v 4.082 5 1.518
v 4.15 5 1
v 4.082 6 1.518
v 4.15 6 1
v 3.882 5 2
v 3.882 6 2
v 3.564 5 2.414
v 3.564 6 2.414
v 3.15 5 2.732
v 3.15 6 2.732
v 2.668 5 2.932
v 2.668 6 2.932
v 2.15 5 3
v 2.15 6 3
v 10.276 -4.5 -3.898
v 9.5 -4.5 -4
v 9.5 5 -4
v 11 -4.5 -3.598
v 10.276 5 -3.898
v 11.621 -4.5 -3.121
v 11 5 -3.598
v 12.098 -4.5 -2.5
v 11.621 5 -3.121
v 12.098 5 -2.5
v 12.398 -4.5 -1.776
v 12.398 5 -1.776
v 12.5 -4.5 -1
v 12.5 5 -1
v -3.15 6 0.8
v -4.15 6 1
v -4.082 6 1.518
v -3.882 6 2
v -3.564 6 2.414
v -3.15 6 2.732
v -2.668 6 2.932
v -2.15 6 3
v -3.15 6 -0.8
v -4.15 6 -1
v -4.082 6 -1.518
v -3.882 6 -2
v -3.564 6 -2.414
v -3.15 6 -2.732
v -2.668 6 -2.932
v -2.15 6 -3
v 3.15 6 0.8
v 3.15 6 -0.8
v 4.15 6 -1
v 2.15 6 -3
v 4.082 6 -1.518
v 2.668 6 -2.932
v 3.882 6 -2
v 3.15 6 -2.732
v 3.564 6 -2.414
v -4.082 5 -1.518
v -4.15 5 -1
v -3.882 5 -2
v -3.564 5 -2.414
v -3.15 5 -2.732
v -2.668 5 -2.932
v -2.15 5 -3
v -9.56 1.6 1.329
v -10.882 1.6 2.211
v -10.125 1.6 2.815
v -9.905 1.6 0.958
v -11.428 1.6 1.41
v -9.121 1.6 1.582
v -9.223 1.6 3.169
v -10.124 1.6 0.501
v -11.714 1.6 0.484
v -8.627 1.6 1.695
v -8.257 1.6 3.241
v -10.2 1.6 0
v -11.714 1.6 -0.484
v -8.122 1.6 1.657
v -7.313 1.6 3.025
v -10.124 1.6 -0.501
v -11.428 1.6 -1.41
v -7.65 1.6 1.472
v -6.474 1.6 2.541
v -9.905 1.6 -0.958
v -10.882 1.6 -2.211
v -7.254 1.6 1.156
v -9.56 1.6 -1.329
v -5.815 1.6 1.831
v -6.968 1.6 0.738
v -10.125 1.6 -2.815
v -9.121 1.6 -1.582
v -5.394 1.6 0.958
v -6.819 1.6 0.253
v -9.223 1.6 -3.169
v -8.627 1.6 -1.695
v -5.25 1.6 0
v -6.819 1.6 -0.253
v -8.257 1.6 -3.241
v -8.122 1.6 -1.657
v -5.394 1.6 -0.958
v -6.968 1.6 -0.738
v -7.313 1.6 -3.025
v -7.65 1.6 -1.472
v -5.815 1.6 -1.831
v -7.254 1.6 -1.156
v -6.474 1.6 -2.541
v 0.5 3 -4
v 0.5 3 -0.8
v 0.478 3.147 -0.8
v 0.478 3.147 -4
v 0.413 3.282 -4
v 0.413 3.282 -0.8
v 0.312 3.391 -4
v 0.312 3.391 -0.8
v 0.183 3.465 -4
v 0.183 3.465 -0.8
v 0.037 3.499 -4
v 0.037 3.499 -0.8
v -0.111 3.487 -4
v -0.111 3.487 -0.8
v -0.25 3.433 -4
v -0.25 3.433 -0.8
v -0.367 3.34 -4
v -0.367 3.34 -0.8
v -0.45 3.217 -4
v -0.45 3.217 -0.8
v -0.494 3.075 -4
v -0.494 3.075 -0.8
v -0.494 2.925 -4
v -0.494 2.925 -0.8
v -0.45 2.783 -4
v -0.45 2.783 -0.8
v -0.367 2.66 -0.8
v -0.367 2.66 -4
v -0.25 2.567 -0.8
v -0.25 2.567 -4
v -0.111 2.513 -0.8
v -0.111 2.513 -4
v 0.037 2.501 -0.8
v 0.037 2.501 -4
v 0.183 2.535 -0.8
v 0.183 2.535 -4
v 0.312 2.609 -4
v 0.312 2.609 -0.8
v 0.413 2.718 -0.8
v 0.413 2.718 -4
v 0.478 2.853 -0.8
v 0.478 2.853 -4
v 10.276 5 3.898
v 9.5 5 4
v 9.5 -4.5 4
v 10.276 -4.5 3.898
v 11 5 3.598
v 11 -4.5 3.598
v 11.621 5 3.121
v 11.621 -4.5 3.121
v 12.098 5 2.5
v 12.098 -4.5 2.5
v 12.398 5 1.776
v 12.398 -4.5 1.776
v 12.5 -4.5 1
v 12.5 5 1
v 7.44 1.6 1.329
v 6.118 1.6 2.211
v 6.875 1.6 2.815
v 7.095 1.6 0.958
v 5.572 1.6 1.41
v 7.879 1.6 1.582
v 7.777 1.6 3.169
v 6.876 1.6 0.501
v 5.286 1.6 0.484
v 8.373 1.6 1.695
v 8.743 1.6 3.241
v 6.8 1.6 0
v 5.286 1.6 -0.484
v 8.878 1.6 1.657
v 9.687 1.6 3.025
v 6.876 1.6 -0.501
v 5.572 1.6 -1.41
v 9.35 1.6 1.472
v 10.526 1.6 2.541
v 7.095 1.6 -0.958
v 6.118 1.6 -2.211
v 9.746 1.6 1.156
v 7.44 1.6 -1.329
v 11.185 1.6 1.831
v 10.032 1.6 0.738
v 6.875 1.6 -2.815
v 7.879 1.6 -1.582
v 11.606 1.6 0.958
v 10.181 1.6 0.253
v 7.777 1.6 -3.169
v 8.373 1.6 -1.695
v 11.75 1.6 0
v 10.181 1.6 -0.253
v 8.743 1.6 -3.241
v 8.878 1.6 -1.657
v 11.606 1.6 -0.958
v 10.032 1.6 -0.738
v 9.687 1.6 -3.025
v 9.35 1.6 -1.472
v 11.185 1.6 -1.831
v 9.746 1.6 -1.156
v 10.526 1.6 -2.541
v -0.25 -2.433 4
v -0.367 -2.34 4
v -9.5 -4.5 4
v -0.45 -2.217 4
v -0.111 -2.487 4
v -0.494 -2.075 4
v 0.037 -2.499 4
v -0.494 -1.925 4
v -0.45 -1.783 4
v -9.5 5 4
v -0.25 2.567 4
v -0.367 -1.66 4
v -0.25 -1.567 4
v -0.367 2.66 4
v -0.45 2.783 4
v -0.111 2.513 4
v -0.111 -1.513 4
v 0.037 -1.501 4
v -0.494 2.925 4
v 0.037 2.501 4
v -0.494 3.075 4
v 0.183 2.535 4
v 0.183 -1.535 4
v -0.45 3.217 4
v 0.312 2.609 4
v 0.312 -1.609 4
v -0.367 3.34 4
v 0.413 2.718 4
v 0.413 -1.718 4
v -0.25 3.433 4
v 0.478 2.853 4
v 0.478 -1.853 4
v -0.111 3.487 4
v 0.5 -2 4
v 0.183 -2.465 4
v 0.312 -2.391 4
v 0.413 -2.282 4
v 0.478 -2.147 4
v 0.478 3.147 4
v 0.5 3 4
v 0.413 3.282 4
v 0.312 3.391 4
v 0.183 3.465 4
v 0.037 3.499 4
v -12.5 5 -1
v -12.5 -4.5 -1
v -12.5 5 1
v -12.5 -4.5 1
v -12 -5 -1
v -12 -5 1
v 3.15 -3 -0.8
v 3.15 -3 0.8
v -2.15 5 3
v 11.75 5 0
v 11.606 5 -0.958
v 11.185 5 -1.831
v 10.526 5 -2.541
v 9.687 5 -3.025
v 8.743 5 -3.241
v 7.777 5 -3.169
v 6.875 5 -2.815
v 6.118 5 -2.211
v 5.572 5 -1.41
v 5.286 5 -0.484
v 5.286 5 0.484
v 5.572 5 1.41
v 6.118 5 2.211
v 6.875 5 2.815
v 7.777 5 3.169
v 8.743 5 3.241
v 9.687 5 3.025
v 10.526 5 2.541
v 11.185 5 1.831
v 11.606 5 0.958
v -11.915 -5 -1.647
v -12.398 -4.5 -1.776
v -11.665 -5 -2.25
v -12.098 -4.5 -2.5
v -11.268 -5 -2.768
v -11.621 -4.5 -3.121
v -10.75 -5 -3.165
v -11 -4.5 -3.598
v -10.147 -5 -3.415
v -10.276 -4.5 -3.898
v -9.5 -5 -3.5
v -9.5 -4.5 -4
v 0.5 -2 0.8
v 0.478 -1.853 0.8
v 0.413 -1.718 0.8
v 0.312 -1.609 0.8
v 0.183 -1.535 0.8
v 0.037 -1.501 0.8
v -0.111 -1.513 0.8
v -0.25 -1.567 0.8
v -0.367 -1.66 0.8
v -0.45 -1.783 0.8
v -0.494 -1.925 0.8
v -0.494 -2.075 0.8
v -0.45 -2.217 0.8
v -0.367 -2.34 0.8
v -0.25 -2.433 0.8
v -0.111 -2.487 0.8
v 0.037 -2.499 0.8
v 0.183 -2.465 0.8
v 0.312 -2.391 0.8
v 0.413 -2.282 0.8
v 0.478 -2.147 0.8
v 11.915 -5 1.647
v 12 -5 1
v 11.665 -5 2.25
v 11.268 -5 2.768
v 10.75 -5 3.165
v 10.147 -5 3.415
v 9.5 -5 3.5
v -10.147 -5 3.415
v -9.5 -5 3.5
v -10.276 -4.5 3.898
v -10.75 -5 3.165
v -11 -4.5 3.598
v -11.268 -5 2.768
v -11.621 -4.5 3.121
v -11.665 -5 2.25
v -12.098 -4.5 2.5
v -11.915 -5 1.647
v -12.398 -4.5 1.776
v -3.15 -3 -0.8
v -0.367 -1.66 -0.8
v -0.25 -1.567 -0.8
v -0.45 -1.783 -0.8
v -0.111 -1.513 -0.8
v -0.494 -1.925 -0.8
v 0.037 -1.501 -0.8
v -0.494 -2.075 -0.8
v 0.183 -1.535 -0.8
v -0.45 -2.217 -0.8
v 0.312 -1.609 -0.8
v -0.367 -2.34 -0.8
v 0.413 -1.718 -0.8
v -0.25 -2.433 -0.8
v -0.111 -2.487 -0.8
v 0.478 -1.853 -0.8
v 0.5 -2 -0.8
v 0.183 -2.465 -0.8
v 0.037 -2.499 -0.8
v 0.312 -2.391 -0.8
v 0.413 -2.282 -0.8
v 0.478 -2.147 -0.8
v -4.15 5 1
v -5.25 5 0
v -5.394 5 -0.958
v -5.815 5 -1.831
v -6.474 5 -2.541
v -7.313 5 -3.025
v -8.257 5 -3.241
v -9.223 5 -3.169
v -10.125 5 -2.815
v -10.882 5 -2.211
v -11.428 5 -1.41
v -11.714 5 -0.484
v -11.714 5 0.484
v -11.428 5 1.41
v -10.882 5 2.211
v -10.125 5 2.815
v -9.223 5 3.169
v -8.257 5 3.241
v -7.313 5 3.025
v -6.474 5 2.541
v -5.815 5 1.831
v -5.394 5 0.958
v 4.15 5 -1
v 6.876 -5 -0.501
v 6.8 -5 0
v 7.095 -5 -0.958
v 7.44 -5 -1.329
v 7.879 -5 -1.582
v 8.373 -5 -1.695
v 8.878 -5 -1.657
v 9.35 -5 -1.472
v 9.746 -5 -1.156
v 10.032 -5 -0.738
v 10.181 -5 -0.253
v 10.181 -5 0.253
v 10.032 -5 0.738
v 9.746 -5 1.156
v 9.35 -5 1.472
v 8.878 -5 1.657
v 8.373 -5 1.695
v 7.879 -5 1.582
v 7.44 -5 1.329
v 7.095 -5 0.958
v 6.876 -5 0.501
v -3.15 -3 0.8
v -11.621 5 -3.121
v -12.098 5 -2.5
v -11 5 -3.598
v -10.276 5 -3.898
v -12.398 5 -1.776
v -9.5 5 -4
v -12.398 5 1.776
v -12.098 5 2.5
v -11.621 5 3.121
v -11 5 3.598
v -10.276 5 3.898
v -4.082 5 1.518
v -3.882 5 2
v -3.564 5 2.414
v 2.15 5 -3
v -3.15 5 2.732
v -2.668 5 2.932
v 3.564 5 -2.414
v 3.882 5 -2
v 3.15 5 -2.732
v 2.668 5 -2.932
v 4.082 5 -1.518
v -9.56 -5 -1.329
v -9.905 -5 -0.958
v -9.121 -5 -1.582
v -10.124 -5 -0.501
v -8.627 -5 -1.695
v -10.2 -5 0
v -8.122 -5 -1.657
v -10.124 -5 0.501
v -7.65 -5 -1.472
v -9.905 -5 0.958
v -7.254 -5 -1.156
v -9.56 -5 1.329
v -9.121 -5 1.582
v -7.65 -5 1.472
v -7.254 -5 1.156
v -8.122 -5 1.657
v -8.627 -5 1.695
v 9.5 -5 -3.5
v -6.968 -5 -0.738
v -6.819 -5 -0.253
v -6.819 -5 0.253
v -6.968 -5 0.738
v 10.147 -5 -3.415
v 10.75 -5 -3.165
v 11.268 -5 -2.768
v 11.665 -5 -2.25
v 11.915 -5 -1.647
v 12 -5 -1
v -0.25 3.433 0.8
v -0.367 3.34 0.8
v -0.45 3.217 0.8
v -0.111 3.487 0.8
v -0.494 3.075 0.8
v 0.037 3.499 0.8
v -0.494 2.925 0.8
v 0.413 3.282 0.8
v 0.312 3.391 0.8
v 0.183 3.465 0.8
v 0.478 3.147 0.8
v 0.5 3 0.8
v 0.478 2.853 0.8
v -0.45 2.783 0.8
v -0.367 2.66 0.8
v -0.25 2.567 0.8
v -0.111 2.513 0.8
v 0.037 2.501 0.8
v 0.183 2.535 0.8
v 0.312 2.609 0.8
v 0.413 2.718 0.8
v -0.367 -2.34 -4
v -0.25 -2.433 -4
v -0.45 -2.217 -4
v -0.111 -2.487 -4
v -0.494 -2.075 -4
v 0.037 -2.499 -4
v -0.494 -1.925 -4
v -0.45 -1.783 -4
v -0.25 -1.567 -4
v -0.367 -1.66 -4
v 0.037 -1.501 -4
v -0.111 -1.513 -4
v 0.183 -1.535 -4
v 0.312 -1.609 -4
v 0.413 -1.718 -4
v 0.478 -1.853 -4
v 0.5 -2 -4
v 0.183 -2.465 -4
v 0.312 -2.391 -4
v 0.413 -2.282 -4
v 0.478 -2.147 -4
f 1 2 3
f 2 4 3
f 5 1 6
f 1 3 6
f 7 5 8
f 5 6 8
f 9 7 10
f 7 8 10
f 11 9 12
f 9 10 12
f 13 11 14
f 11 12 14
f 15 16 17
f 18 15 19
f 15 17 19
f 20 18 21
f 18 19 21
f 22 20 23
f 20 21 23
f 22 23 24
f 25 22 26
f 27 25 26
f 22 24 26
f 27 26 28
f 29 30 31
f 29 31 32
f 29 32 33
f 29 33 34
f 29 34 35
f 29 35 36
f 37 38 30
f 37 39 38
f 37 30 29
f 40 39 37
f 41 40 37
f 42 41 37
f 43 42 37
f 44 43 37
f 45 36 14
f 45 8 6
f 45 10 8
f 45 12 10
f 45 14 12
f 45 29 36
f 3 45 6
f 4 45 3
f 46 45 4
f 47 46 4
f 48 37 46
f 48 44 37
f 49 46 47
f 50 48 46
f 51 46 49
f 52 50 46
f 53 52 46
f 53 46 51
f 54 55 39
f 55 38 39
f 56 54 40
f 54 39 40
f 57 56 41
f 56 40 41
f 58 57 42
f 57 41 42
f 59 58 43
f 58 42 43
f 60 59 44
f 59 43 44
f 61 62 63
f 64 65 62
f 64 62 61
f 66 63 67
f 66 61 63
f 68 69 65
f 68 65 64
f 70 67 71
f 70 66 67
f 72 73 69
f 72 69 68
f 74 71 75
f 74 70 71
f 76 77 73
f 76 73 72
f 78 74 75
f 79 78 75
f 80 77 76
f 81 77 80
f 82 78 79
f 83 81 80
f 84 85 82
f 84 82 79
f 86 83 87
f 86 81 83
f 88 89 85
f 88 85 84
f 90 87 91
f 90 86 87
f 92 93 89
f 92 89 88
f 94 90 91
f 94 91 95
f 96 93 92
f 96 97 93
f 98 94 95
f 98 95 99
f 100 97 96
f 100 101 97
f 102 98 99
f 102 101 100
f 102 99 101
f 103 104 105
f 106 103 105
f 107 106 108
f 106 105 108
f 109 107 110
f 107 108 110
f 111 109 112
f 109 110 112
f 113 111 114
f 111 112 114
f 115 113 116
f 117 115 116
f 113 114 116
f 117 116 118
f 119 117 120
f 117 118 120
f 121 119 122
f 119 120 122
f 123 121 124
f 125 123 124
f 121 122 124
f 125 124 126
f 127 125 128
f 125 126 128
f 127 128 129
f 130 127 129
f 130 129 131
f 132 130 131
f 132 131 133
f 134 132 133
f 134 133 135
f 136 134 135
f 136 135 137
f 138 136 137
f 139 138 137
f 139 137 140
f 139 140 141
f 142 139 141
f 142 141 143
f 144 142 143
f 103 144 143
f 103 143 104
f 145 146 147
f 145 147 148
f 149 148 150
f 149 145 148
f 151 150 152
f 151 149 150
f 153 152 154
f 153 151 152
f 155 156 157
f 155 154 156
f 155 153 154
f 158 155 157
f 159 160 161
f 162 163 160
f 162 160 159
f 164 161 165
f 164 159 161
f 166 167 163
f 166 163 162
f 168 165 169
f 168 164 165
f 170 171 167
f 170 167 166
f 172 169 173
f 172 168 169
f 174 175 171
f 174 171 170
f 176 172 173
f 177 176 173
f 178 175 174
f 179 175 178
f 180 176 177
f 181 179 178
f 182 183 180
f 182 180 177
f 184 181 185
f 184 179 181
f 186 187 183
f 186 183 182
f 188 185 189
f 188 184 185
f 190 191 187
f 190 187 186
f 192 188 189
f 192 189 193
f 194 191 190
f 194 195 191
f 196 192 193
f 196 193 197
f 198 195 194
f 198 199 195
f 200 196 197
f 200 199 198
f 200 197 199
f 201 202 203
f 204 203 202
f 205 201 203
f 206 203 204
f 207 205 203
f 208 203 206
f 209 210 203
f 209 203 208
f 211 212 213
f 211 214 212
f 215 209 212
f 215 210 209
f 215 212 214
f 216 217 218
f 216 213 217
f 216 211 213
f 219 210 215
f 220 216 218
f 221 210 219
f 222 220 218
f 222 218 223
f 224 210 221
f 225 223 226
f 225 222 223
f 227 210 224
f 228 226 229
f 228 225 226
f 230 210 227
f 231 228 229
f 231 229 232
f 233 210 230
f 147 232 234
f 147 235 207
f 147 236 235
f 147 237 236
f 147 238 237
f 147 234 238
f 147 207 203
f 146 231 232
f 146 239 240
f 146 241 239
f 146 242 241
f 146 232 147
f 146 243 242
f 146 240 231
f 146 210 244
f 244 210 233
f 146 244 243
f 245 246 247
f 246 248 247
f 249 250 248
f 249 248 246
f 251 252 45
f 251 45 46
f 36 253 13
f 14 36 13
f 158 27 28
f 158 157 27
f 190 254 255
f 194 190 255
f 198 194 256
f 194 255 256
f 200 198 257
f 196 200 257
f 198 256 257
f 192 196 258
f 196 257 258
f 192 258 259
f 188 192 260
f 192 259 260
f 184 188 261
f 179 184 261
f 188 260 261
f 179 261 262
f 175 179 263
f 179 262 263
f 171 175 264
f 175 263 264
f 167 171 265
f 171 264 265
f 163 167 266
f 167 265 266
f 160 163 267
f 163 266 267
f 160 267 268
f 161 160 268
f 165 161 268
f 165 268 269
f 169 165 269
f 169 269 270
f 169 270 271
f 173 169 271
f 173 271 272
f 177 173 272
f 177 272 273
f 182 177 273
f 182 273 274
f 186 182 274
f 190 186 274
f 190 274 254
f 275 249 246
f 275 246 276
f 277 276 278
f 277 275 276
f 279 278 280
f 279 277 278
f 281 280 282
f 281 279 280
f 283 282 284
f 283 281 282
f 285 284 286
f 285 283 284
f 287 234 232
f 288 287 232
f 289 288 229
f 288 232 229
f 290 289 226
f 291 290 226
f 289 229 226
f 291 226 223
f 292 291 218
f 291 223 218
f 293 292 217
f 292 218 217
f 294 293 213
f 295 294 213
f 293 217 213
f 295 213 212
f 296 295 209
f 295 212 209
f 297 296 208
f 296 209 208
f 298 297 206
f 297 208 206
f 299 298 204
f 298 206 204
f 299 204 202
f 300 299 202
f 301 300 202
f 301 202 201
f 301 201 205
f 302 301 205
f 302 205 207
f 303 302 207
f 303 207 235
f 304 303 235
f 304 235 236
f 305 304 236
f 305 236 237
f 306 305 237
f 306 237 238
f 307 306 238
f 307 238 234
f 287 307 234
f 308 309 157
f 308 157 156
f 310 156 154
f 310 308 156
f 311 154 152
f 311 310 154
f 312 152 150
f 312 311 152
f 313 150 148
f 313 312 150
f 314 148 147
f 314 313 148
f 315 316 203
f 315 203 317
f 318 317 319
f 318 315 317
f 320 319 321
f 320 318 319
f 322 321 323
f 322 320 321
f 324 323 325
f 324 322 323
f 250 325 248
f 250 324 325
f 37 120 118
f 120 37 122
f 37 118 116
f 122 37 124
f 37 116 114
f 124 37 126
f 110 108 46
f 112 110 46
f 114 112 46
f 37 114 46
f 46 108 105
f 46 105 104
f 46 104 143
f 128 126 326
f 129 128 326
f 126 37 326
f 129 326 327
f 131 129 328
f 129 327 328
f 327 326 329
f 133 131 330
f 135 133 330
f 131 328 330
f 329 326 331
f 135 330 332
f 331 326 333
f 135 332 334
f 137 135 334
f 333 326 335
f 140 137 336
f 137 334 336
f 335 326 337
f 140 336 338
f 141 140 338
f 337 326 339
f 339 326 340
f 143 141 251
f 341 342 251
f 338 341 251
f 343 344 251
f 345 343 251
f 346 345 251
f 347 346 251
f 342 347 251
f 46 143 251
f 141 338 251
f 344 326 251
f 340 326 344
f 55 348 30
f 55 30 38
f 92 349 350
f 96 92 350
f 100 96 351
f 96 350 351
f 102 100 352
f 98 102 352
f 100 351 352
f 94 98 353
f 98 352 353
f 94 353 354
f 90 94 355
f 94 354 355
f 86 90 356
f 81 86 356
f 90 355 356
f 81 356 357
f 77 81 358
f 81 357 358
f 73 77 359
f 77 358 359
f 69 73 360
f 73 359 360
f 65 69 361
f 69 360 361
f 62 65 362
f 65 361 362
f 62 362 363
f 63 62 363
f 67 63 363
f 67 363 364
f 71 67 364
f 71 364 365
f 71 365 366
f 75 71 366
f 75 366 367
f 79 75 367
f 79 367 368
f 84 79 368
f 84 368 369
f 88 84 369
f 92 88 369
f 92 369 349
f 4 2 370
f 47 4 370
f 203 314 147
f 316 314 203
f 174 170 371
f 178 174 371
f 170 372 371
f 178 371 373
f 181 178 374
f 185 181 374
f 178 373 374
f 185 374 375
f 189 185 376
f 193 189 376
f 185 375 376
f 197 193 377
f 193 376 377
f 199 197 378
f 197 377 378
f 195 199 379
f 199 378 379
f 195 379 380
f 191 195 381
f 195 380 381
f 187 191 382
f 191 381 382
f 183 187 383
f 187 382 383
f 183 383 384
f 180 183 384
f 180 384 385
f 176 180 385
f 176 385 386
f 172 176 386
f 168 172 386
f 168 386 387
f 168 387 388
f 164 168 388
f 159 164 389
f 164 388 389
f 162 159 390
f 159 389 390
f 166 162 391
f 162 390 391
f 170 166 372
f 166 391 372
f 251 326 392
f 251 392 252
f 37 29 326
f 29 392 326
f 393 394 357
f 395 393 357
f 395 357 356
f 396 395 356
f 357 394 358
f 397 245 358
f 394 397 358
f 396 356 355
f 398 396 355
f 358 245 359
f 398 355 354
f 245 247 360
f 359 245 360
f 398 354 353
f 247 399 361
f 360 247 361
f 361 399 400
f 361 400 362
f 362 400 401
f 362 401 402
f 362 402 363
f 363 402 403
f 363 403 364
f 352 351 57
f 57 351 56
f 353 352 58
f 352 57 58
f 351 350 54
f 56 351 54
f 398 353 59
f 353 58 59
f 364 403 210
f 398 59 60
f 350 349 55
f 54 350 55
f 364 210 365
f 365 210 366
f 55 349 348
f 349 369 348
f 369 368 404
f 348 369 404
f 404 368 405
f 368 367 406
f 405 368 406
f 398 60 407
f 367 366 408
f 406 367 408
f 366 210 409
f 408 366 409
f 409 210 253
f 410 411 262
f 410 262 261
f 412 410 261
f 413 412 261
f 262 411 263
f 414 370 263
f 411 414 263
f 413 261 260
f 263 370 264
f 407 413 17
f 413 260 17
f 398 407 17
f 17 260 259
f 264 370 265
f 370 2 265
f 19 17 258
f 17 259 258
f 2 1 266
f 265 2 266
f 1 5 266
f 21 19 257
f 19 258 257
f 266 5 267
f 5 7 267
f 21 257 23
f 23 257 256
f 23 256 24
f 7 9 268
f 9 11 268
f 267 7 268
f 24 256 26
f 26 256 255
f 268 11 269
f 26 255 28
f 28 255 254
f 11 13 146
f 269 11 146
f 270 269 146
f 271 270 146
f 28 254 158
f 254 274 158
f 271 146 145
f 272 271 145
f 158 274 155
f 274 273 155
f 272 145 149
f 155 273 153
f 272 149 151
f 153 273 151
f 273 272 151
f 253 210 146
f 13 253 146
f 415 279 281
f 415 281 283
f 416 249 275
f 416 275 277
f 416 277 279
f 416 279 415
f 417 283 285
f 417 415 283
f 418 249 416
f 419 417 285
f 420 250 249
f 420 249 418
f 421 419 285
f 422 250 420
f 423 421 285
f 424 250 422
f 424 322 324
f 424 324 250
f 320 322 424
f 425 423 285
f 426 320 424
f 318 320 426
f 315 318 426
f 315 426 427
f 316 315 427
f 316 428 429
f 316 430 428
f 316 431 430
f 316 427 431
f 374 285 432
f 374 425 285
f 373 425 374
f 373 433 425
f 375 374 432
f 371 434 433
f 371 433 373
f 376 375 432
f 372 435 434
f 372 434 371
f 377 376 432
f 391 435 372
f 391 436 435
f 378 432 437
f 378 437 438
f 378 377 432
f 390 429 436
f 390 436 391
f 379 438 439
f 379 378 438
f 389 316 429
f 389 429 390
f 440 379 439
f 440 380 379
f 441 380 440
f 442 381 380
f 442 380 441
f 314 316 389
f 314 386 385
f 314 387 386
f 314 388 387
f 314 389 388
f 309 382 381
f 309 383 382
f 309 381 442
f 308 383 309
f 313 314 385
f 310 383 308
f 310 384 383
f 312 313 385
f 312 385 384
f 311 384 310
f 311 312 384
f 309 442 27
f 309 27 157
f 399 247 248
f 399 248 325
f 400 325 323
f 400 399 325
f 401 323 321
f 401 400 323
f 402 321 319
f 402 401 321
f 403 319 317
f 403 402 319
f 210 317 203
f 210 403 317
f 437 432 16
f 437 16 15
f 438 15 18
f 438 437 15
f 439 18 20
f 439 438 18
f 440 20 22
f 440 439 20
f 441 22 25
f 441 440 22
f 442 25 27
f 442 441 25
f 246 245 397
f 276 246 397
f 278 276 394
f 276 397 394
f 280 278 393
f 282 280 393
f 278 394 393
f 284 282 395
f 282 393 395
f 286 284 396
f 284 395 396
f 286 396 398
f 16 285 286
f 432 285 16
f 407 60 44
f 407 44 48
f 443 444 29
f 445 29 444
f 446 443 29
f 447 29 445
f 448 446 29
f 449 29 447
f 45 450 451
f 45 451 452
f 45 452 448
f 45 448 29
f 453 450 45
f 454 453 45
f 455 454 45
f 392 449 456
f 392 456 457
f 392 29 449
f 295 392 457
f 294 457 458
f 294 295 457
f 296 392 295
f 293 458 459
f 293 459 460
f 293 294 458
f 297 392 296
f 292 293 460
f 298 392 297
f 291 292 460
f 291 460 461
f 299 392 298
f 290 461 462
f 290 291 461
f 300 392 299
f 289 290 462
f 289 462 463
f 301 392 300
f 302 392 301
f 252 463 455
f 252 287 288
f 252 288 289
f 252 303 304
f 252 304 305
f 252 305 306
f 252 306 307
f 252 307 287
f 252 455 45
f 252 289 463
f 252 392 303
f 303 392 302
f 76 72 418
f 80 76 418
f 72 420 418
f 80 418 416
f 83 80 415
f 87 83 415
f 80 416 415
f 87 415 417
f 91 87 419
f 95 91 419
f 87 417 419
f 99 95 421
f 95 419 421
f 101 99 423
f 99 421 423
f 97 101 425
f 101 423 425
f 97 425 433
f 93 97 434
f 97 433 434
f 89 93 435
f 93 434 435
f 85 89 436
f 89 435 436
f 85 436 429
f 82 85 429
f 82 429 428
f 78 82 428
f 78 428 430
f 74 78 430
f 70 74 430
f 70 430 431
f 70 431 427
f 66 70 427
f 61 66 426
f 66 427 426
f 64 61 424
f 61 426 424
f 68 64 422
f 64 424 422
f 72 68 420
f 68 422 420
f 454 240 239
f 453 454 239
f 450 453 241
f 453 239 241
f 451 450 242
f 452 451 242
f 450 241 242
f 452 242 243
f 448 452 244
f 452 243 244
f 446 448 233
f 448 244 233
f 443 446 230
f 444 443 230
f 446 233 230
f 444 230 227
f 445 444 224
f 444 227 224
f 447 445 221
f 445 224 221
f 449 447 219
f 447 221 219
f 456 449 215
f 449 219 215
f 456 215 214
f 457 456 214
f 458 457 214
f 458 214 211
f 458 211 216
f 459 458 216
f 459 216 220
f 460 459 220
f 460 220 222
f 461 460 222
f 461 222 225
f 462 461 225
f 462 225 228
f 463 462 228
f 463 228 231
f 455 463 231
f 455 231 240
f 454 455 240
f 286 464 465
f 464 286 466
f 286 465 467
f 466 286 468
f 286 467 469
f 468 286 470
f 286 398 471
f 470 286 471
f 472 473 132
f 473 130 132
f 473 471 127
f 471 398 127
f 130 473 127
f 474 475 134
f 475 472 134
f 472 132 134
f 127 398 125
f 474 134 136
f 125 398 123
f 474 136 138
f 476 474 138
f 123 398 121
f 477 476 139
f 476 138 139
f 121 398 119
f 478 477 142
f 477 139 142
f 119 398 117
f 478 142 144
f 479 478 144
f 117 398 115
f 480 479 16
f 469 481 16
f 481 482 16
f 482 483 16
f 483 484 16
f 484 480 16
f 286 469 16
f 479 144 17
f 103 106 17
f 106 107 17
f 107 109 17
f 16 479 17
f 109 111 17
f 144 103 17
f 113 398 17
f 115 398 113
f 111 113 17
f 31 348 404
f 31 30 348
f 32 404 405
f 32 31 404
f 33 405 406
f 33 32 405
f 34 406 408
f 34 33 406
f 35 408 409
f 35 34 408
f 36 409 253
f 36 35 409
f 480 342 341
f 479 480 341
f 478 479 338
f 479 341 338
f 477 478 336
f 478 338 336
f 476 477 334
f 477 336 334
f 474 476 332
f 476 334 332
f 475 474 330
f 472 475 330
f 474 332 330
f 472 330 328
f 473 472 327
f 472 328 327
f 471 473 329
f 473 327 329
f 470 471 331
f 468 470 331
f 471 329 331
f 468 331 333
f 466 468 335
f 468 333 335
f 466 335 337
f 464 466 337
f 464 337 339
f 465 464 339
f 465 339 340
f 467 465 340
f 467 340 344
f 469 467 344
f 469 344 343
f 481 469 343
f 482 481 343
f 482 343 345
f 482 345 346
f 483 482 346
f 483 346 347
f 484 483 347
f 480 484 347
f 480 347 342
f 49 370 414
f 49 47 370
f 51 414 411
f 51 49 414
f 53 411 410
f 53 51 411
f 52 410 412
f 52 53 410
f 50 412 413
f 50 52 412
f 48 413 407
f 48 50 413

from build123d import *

# Parameters (mm, degrees)
SKIZZE1_W                                            = 25
SKIZZE1_H                                            = 10
AUFSATZ_LINEAR_AUSTRAGEN1_DEPTH                      = 4
STIRNSENKUNG_F_R_M3_ZYLINDERSCHRAUBE_MIT_D           = 3.4
STIRNSENKUNG_F_R_M3_ZYLINDERSCHRAUBE_MIT_CBORE_D     = 6.5
STIRNSENKUNG_F_R_M3_ZYLINDERSCHRAUBE_MIT_CBORE_DEPTH = 3.4
VERRUNDUNG1_R                                        = 3
SKIZZE4_W                                            = 6.3
SKIZZE4_H                                            = 1.6
SCHNITT_LINEAR_AUSTRAGEN1_DEPTH                      = 8
SKIZZE5_W                                            = 8.3
SKIZZE5_H                                            = 6
SKIZZE5_W_2                                          = 6.3
SKIZZE5_H_2                                          = 1.6
AUFSATZ_LINEAR_AUSTRAGEN2_DEPTH                      = 1
VERRUNDUNG2_R                                        = 2
SKIZZE6_R                                            = 0.5
SCHNITT_LINEAR_AUSTRAGEN2_DEPTH                      = 9
FASE1_SIZE                                           = 0.5


with BuildPart() as part:
    # Skizze1 → Aufsatz-Linear austragen1 (new body, symmetric)
    with BuildSketch(Plane.XY):
        Rectangle(SKIZZE1_W, SKIZZE1_H)
    extrude(amount=AUFSATZ_LINEAR_AUSTRAGEN1_DEPTH, both=True)

    # Stirnsenkung für M3 Zylinderschraube mit Innensechskant1 (through all)
    with Locations(Plane(origin=(0, 5, 0), x_dir=(1, 0, 0), z_dir=(0, 1, 0))):
        with Locations((-8.5, 0), (8.5, 0)):
            CounterBoreHole(STIRNSENKUNG_F_R_M3_ZYLINDERSCHRAUBE_MIT_D / 2, STIRNSENKUNG_F_R_M3_ZYLINDERSCHRAUBE_MIT_CBORE_D / 2, STIRNSENKUNG_F_R_M3_ZYLINDERSCHRAUBE_MIT_CBORE_DEPTH)

    # Verrundung1
    verrundung1_edges = [part.edges().sort_by_distance(p)[0] for p in [
        (12.5, 0, 4),
        (-12.5, 0, 4),
        (12.5, 0, -4),
        (-12.5, 0, -4),
    ]]
    fillet(verrundung1_edges, radius=VERRUNDUNG1_R)

    # Skizze4 → Schnitt-Linear austragen1 (cut)
    with BuildSketch(Plane(origin=(0, 5, 0), x_dir=(1, 0, 0), z_dir=(0, 1, 0))):
        Rectangle(SKIZZE4_W, SKIZZE4_H)
    extrude(amount=-SCHNITT_LINEAR_AUSTRAGEN1_DEPTH, mode=Mode.SUBTRACT)

    # Skizze5 → Aufsatz-Linear austragen2 (add)
    with BuildSketch(Plane(origin=(0, 5, 0), x_dir=(1, 0, 0), z_dir=(0, 1, 0))):
        Rectangle(SKIZZE5_W, SKIZZE5_H)
        Rectangle(SKIZZE5_W_2, SKIZZE5_H_2, mode=Mode.SUBTRACT)
    extrude(amount=AUFSATZ_LINEAR_AUSTRAGEN2_DEPTH)

    # Verrundung2
    verrundung2_edges = [part.edges().sort_by_distance(p)[0] for p in [
        (-4.15, 5.5, -3),
        (-4.15, 5.5, 3),
        (4.15, 5.5, 3),
        (4.15, 5.5, -3),
    ]]
    fillet(verrundung2_edges, radius=VERRUNDUNG2_R)

    # Skizze6 → Schnitt-Linear austragen2 (cut, through all)
    with BuildSketch(Plane.XY.offset(4)):
        with Locations((0, 3)):
            Circle(SKIZZE6_R)
        with Locations((0, -2)):
            Circle(SKIZZE6_R)
    extrude(amount=-SCHNITT_LINEAR_AUSTRAGEN2_DEPTH, mode=Mode.SUBTRACT)

    # Fase1
    fase1_edges = [part.edges().sort_by_distance(p)[0] for p in [
        (12.5, -5, 0),
        (0, -5, -4),
        (0, -5, 4),
        (-12.5, -5, 0),
        (-11.621320344, -5, 3.121320344),
        (-11.621320344, -5, -3.121320344),
        (11.621320344, -5, 3.121320344),
        (11.621320344, -5, -3.121320344),
    ]]
    chamfer(fase1_edges, length=FASE1_SIZE)


solid = part.part
